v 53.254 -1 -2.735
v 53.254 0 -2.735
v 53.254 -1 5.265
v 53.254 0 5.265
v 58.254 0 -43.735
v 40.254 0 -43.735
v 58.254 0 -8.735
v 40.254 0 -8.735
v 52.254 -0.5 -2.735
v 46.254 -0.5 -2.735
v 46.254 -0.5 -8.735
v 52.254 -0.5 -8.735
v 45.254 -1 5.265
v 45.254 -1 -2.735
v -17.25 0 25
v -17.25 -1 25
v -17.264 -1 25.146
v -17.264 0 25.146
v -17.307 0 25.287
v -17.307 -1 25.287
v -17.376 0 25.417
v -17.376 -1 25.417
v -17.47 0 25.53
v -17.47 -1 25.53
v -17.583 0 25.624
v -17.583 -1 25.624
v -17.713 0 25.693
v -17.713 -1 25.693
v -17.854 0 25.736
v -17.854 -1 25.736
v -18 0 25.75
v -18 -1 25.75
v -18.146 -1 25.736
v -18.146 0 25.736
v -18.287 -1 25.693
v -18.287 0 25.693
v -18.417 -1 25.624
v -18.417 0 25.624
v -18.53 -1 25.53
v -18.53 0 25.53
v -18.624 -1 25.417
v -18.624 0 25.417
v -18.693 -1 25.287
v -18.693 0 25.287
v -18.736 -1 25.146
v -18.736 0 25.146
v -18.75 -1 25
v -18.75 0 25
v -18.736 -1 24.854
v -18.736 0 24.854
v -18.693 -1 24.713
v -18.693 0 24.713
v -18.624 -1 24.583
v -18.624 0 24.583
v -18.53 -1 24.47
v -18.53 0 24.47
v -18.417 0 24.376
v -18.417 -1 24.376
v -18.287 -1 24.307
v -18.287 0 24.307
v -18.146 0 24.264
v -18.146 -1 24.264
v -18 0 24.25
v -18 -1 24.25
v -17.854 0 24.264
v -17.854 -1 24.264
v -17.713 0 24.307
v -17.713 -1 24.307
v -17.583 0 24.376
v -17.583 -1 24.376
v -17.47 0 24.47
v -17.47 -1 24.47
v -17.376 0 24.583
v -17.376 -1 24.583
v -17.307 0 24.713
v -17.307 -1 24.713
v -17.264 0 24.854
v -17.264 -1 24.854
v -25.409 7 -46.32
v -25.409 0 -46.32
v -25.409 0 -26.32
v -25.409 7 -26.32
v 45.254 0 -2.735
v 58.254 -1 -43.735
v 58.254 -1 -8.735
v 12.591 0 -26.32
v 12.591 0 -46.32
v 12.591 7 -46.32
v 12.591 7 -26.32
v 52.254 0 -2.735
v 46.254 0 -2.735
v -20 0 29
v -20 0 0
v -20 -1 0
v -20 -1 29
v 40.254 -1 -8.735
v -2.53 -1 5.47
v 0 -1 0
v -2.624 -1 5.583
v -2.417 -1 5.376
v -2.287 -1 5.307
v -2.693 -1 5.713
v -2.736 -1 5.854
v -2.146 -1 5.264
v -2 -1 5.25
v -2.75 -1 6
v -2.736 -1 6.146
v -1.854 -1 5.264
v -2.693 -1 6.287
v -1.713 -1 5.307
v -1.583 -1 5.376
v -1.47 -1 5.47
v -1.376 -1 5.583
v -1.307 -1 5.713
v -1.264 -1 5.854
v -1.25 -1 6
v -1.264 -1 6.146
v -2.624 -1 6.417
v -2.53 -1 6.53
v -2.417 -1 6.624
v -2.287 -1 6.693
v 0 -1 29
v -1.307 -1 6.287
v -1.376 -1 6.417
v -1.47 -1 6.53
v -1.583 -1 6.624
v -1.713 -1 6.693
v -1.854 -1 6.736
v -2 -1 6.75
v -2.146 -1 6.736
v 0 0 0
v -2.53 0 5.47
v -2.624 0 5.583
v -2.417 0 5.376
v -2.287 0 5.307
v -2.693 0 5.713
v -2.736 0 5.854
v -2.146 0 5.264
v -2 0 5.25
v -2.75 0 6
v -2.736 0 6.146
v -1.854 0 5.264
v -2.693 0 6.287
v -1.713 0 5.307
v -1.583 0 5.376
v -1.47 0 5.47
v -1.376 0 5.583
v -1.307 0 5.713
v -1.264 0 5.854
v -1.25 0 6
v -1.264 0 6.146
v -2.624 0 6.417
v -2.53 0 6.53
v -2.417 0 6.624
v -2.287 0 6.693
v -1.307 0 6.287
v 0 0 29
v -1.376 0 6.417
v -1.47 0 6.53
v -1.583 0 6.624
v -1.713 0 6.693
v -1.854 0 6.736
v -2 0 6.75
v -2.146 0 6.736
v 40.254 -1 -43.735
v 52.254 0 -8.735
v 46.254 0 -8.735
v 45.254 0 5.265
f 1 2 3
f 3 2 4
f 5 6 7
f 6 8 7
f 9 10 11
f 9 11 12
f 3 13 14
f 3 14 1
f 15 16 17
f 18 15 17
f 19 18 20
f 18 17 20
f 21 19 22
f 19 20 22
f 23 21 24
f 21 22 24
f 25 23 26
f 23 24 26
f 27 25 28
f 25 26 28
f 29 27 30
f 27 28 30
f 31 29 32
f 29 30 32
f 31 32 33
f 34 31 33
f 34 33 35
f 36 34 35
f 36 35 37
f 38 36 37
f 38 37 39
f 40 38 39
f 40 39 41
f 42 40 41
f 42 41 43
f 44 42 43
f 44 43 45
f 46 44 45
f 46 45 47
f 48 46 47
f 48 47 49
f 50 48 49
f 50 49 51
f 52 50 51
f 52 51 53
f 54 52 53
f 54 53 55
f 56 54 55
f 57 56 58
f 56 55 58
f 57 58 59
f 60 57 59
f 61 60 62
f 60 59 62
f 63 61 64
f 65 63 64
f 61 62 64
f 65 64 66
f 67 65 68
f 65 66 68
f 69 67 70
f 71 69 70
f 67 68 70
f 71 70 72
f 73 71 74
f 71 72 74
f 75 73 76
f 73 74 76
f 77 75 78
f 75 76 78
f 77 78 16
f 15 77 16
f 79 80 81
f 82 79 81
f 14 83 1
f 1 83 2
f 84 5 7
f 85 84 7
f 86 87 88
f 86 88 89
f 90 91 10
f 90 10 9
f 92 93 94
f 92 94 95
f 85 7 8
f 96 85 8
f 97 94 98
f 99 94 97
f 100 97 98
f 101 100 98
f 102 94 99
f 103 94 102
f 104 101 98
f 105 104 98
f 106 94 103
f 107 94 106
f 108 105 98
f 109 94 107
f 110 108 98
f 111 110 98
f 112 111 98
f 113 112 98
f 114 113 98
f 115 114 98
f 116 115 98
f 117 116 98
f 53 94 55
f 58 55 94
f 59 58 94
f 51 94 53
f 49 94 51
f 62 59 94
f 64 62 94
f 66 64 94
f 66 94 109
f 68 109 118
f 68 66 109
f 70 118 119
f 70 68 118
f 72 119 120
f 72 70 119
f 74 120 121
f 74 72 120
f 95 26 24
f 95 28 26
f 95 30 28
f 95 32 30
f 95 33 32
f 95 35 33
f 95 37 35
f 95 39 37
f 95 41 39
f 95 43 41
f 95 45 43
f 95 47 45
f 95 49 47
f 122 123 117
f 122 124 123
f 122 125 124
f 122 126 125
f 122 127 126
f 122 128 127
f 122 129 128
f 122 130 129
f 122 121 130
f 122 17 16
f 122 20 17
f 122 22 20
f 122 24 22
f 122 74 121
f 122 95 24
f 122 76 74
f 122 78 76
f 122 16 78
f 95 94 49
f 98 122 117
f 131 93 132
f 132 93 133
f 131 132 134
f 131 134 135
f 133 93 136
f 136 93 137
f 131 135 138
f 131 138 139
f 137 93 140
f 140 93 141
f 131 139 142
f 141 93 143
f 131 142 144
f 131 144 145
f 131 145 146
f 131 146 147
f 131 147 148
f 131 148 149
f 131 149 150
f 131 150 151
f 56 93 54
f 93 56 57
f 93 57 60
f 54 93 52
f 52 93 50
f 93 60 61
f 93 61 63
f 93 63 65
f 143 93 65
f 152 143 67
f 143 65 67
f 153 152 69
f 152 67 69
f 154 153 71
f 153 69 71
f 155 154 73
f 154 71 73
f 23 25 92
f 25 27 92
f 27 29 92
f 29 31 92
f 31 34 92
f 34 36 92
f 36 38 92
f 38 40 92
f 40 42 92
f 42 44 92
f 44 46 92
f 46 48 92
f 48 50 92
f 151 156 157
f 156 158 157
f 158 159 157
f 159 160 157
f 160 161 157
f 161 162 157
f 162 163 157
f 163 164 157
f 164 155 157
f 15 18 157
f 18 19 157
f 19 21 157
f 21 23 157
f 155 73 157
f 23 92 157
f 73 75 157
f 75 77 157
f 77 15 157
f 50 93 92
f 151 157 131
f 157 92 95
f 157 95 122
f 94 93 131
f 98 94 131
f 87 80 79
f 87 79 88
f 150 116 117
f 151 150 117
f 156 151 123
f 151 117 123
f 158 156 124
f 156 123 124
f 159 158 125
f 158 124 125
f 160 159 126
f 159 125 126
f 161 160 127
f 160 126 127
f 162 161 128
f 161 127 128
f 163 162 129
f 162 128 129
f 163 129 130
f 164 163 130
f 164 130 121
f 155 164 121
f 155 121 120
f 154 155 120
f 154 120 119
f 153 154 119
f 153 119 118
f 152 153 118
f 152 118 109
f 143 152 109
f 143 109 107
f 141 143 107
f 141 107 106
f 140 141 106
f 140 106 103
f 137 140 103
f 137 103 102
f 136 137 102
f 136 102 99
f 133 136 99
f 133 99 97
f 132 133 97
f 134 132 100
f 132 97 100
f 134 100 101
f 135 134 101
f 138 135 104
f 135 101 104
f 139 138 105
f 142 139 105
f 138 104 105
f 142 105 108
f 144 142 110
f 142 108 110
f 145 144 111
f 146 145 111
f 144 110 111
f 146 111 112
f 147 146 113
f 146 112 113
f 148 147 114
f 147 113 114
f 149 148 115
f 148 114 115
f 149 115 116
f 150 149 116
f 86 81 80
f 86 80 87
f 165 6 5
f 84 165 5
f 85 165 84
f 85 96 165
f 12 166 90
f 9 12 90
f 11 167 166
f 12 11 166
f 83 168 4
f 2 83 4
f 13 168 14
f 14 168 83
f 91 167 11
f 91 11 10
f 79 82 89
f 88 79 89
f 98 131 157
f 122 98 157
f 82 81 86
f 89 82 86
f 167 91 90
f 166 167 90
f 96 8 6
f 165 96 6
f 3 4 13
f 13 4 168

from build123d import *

# Parameters (mm, degrees)
F0_W     = 20
F0_H     = 29
F1_DEPTH = 1
F2_R     = 0.75
F3_DEPTH = 25
F5_DEPTH = 1
F4_W     = 6
F4_H     = 6
F6_DEPTH = 0.5
F7_W     = 38
F7_H     = 20
F8_DEPTH = 7


with BuildPart() as f1:
    # F0 (on Front) → F1 (new body)
    with BuildSketch(Plane.XZ):
        with Locations((-10, 14.5)):
            Rectangle(F0_W, F0_H)
    extrude(amount=F1_DEPTH)

    # F2 (on face) → F3 (cut)
    with BuildSketch(Plane.XZ.offset(1)):
        with Locations((-2, 6)):
            Circle(F2_R)
        with Locations((-18, 25)):
            Circle(F2_R)
    extrude(amount=-F3_DEPTH, mode=Mode.SUBTRACT)


with BuildPart() as f5:
    # F4 (on Front) → F5 (new body)
    with BuildSketch(Plane.XZ):
        Polygon((40.253546, -43.734884), (58.253546, -43.734884), (58.253546, -8.734884), (52.253546, -8.734884), (46.253546, -8.734884), (40.253546, -8.734884), align=None)
        Polygon((46.253546, -2.734884), (52.253546, -2.734884), (53.253546, -2.734884), (53.253546, 5.265116), (45.253546, 5.265116), (45.253546, -2.734884), align=None)
    extrude(amount=F5_DEPTH)


with BuildPart() as f6:
    # F4 (on Front) → F6 (new body)
    with BuildSketch(Plane.XZ):
        with Locations((49.253546, -5.734884)):
            Rectangle(F4_W, F4_H)
    extrude(amount=F6_DEPTH)


with BuildPart() as f8:
    # F7 (on Front) → F8 (new body)
    with BuildSketch(Plane.XZ):
        with Locations((-6.408643, -36.319511)):
            Rectangle(F7_W, F7_H)
    extrude(amount=-F8_DEPTH)


solid = Compound([f1.part, f5.part, f6.part, f8.part])
